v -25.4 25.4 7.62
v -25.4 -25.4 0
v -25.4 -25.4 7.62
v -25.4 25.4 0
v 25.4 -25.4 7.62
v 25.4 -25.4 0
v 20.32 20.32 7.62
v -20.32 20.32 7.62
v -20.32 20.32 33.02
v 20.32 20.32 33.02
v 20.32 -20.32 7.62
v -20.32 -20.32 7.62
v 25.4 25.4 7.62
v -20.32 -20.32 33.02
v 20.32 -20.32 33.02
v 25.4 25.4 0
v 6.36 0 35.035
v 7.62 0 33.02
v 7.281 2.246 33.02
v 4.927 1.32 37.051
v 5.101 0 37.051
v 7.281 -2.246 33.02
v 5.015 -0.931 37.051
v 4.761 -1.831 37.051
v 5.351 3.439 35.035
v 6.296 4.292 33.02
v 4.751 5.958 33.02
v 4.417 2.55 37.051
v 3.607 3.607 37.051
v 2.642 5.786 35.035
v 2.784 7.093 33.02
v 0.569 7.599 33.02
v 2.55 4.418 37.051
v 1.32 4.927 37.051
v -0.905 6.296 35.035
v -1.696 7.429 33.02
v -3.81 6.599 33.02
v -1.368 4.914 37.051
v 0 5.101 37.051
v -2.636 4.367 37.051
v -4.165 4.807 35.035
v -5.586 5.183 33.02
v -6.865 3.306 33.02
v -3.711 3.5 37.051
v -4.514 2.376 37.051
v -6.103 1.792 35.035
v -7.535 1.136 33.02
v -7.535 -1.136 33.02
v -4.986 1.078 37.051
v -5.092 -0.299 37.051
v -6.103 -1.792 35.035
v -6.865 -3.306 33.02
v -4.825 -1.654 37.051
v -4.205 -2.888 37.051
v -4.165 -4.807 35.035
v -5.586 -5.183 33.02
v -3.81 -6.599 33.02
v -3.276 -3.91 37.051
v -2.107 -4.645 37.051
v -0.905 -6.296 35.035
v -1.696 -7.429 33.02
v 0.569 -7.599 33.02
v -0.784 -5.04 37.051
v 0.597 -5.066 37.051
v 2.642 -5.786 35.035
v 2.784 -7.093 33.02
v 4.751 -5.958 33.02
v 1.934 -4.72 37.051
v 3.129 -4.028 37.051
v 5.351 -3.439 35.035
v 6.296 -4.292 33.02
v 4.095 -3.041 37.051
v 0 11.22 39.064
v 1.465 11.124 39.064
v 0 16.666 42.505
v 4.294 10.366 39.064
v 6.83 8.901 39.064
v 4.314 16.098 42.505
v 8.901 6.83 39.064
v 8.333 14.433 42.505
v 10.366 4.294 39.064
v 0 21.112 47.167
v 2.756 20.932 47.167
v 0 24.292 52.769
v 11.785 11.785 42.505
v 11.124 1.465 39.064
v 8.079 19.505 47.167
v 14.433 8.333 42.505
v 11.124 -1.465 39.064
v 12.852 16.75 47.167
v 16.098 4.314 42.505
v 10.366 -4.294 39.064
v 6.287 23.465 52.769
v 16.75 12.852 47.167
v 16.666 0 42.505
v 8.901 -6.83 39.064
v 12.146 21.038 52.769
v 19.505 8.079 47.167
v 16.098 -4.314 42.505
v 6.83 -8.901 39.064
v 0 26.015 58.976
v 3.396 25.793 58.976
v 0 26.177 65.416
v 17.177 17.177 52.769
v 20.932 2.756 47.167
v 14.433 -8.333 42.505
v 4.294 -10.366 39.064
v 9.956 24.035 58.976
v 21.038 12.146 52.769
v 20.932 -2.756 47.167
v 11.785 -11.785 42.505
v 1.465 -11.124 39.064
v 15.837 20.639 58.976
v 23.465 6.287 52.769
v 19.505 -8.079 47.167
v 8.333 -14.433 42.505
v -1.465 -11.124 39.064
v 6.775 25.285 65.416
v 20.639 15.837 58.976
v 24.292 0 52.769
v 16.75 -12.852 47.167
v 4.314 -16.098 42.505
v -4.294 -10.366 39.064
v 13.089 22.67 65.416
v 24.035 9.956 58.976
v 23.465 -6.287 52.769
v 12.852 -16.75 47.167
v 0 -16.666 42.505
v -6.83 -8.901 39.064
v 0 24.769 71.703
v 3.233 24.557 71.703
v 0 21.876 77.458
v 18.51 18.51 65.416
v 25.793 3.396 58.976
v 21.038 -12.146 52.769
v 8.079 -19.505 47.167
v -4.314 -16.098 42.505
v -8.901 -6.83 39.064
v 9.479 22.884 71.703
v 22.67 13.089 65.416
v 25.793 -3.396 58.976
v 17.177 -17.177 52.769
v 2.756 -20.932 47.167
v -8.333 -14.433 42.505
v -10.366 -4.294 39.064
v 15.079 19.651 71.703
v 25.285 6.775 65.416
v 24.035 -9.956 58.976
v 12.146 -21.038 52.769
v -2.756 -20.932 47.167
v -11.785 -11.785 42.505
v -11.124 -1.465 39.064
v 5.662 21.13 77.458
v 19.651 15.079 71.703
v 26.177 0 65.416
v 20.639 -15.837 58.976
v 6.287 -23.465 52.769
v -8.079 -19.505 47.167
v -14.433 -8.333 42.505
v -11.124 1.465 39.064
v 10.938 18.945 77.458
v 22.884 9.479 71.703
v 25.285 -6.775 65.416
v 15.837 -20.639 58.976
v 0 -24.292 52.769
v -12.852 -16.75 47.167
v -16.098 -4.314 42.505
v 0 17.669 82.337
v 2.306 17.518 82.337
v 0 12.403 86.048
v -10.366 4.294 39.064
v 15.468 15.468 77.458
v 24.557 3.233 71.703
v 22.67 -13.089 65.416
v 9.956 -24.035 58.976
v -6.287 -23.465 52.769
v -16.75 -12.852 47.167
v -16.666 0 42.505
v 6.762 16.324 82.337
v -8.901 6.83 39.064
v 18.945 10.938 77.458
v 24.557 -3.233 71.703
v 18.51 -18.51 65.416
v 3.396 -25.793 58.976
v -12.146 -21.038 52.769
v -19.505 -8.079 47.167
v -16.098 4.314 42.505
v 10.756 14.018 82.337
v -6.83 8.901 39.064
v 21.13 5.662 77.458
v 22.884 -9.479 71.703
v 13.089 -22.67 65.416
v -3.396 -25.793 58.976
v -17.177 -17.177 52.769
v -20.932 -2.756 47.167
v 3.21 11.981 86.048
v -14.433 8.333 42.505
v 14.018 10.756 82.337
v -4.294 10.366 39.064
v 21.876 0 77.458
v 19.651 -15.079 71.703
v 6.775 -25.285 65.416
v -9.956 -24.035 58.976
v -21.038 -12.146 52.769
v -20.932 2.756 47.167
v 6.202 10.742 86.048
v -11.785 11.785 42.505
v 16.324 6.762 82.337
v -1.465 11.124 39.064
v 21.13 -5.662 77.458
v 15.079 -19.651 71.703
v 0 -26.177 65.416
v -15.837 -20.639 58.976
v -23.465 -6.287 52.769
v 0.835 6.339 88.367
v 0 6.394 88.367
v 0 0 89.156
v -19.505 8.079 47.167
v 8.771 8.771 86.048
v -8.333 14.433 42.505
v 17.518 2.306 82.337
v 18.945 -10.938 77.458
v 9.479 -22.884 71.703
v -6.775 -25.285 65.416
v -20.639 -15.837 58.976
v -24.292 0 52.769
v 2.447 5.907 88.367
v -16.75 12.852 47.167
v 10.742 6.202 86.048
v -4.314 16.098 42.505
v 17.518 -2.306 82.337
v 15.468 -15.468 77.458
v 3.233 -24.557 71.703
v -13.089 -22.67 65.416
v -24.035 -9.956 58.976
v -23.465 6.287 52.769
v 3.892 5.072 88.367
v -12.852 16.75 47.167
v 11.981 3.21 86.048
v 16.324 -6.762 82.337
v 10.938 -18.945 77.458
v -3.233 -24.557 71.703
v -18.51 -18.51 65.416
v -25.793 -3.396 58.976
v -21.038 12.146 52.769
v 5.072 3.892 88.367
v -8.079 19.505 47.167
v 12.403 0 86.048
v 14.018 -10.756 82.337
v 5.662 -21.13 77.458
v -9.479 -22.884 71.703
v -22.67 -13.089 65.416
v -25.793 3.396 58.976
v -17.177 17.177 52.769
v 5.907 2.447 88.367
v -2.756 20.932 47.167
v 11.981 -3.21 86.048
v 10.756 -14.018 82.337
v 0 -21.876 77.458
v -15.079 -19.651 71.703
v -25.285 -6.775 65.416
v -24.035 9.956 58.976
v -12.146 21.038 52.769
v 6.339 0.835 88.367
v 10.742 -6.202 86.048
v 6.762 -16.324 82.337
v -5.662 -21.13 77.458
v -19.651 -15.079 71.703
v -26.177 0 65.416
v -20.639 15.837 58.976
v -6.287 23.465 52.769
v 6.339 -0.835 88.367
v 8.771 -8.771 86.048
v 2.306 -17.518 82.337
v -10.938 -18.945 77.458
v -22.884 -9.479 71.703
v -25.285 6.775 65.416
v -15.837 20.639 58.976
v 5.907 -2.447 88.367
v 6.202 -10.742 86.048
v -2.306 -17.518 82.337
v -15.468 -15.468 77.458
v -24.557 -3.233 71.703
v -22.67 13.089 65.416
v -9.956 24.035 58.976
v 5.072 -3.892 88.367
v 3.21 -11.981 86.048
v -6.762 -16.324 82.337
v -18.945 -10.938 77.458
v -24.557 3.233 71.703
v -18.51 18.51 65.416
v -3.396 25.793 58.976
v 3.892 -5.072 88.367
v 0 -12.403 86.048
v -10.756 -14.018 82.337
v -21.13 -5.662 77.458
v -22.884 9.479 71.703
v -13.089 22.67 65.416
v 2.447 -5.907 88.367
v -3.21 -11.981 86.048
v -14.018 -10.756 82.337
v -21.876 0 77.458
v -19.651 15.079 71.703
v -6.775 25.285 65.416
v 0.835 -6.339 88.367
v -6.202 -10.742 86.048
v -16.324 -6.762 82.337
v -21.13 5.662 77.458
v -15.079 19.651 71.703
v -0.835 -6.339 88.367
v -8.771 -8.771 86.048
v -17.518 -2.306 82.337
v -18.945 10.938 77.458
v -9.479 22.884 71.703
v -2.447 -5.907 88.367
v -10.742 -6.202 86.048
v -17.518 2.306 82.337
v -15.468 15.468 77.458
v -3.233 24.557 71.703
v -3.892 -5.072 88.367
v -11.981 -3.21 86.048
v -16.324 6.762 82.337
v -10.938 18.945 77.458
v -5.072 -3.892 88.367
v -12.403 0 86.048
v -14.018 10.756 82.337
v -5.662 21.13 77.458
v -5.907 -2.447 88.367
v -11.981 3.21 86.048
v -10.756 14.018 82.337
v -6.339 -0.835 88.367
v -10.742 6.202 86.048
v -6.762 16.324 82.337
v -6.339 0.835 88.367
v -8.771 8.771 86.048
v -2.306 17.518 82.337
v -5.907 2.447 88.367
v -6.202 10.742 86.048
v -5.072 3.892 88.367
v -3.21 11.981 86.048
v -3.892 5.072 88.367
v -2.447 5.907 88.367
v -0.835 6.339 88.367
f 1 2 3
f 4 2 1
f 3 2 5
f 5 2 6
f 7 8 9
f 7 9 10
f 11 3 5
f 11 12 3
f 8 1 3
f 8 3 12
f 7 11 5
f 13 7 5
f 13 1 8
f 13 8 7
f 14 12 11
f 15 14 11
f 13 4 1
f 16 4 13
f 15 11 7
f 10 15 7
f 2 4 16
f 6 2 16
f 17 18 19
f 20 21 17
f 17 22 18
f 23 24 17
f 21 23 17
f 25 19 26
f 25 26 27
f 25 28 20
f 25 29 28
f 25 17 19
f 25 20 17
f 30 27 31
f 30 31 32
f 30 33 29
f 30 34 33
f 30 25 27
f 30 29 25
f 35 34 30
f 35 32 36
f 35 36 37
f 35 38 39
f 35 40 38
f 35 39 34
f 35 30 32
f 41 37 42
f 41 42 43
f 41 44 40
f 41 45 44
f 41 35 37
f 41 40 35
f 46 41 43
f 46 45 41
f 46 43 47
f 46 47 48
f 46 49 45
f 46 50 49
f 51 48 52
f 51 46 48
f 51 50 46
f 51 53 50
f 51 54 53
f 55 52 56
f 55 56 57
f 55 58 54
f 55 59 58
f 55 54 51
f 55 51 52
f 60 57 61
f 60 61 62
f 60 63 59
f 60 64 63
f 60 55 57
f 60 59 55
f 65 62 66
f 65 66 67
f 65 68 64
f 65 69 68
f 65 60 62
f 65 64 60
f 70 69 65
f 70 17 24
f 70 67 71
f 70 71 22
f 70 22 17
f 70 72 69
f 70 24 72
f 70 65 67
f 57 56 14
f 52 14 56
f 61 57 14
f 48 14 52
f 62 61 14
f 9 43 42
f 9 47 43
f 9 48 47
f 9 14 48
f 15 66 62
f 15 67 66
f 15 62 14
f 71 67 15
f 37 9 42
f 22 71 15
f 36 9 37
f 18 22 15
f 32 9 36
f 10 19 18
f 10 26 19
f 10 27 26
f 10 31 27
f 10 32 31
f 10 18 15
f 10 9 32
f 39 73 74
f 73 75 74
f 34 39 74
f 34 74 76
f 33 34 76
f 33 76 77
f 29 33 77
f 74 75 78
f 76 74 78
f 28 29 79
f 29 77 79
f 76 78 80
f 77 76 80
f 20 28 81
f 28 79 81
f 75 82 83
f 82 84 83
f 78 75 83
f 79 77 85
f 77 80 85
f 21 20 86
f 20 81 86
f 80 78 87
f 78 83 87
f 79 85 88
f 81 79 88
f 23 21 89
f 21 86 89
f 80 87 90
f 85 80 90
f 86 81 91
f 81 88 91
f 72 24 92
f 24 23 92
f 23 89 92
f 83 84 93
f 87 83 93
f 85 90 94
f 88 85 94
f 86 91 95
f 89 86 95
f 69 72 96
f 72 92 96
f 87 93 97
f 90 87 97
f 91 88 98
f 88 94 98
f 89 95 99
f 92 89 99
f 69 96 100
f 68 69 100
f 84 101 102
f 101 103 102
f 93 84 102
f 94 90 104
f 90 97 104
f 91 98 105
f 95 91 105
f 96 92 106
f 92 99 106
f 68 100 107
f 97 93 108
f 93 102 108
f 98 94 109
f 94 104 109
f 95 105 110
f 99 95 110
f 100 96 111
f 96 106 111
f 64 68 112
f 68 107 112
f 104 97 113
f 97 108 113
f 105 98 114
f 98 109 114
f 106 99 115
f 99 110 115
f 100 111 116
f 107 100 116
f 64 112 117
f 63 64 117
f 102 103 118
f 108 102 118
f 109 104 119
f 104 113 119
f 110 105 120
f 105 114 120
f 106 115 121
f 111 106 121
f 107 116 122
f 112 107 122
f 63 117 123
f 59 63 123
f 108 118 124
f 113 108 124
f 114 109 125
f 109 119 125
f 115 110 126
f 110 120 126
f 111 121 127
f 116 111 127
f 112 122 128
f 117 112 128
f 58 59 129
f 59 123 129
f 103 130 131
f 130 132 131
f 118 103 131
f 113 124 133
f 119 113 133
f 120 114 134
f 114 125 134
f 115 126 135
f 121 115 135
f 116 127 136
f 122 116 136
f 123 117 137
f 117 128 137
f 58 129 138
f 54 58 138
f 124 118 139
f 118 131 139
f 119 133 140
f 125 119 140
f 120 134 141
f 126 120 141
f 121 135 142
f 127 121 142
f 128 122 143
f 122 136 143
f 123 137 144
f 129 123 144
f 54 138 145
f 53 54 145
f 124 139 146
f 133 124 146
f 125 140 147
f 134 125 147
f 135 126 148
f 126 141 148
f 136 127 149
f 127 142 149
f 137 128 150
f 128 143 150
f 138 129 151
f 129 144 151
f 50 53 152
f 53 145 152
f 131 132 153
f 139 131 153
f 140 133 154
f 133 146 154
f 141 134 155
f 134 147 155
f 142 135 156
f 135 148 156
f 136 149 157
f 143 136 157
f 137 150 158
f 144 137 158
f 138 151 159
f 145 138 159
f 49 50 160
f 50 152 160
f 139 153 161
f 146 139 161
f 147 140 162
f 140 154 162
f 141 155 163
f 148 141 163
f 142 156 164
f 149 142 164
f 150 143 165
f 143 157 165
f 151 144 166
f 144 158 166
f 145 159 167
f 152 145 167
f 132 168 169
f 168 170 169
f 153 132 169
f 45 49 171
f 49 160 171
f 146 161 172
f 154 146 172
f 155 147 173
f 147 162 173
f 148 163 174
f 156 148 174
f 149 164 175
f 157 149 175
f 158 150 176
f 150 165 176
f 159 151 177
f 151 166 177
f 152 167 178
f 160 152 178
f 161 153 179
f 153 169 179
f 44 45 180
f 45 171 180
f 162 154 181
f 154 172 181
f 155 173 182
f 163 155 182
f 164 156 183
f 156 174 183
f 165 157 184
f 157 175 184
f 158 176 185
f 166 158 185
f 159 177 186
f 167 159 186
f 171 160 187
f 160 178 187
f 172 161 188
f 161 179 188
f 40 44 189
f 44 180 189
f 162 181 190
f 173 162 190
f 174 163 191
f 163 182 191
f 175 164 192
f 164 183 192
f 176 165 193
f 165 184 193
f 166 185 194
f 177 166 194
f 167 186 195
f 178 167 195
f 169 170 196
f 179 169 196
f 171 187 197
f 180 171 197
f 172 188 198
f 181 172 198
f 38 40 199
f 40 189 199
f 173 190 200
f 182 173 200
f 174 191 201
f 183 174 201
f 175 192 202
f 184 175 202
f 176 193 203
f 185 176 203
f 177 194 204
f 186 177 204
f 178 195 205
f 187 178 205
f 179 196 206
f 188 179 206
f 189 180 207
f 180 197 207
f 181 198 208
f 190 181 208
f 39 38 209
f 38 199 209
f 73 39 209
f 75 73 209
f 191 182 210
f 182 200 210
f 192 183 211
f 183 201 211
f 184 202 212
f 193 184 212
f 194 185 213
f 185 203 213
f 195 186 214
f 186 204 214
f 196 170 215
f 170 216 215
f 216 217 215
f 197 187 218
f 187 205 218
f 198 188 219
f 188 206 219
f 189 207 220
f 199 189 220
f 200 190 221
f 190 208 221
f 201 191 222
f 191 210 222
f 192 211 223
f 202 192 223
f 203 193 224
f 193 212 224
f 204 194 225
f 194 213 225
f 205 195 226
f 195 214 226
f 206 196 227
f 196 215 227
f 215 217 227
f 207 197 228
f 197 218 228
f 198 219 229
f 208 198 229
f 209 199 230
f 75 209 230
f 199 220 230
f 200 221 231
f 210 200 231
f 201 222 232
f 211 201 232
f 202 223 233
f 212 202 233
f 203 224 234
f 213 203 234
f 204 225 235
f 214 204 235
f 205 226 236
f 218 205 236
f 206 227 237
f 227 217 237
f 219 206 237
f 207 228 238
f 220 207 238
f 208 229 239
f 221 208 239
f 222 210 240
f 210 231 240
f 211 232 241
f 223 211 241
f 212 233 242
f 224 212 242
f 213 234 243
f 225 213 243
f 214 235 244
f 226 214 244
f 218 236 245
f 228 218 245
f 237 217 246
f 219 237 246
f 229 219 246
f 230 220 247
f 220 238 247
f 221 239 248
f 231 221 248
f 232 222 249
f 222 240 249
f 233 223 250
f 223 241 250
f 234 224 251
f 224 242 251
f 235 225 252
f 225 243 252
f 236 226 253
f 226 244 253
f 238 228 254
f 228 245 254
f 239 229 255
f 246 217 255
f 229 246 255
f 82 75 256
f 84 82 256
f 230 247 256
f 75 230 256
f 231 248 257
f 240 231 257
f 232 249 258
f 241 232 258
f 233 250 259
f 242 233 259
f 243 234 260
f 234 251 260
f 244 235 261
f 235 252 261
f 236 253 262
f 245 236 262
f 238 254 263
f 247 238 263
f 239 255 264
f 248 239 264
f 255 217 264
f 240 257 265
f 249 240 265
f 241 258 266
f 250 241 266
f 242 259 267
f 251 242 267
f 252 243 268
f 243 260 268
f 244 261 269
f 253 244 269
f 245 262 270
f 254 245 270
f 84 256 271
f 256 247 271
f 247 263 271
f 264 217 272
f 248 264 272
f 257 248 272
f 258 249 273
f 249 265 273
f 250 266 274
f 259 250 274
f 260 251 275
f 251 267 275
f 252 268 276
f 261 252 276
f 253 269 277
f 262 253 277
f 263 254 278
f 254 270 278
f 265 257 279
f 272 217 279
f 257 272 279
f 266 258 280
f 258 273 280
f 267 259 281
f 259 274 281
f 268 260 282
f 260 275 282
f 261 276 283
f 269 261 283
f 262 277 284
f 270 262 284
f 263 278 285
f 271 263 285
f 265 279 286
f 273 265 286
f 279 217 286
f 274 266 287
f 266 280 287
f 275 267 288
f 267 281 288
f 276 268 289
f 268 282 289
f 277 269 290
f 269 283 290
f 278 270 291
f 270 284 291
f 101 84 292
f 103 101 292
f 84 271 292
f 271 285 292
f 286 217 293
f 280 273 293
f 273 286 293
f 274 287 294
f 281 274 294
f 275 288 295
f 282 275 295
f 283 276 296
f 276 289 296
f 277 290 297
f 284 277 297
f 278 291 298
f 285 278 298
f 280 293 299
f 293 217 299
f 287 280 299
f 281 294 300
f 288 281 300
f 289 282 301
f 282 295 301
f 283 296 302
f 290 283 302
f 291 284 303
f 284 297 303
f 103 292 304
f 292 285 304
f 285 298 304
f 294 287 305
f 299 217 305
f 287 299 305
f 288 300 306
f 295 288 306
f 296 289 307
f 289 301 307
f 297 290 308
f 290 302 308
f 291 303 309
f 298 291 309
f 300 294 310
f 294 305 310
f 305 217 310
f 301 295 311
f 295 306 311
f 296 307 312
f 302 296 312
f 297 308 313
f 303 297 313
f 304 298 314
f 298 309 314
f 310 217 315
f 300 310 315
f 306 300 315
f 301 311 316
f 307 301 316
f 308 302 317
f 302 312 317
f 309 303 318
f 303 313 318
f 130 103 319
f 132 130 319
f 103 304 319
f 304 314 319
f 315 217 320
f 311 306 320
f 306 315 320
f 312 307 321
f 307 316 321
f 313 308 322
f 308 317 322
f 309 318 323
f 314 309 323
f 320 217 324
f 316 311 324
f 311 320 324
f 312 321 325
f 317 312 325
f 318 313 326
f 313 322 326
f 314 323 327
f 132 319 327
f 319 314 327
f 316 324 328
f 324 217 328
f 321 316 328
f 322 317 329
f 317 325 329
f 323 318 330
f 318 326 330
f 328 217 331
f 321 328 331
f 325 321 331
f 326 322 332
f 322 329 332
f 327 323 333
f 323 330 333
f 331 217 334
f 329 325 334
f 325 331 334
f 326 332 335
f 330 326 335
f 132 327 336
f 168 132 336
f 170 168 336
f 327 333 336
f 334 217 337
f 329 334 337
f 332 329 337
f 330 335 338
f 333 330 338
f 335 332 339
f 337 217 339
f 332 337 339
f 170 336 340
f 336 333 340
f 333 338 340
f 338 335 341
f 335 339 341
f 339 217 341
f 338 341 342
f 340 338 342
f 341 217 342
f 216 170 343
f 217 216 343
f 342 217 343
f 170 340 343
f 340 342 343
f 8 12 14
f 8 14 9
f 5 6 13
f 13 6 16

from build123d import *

# Parameters (mm, degrees)
F0_W     = 50.8
F0_H     = 50.8
F1_DEPTH = 7.62
F2_W     = 40.64
F2_H     = 40.64
F3_DEPTH = 25.4
F4_R     = 7.62
F6_R     = 4.445


with BuildPart() as f1:
    # F0 (on Top) → F1 (new body)
    with BuildSketch(Plane.XY):
        Rectangle(F0_W, F0_H)
    extrude(amount=F1_DEPTH)

    # F2 (on face) → F3 (join)
    with BuildSketch(Plane.XY.offset(7.62)):
        Rectangle(F2_W, F2_H)
    extrude(amount=F3_DEPTH)

    # F4 (on face) → F7 section 0
    with BuildSketch(Plane.XY.offset(33.02)):
        Circle(F4_R)
    # F6 (on offset) → F7 section 1
    with BuildSketch(Plane.XY.offset(38.1)):
        Circle(F6_R)
    loft()

    # F9 (on offset) → F10 (revolve)
    with BuildSketch(Plane.YZ):
        with BuildLine():
            Line((0, 37.4538087019), (0, 36.551290824))
            ThreePointArc((0, 36.551290824), (26.302517878, 62.8538087019), (0, 89.1563265799))
            Line((0, 89.1563265799), (0, 88.2538087019))
            Line((0, 88.2538087019), (0, 37.4538087019))
        make_face()
    revolve(axis=Axis((0, 0, 62.8538087019), (0, 0, -1)))


solid = f1.part
